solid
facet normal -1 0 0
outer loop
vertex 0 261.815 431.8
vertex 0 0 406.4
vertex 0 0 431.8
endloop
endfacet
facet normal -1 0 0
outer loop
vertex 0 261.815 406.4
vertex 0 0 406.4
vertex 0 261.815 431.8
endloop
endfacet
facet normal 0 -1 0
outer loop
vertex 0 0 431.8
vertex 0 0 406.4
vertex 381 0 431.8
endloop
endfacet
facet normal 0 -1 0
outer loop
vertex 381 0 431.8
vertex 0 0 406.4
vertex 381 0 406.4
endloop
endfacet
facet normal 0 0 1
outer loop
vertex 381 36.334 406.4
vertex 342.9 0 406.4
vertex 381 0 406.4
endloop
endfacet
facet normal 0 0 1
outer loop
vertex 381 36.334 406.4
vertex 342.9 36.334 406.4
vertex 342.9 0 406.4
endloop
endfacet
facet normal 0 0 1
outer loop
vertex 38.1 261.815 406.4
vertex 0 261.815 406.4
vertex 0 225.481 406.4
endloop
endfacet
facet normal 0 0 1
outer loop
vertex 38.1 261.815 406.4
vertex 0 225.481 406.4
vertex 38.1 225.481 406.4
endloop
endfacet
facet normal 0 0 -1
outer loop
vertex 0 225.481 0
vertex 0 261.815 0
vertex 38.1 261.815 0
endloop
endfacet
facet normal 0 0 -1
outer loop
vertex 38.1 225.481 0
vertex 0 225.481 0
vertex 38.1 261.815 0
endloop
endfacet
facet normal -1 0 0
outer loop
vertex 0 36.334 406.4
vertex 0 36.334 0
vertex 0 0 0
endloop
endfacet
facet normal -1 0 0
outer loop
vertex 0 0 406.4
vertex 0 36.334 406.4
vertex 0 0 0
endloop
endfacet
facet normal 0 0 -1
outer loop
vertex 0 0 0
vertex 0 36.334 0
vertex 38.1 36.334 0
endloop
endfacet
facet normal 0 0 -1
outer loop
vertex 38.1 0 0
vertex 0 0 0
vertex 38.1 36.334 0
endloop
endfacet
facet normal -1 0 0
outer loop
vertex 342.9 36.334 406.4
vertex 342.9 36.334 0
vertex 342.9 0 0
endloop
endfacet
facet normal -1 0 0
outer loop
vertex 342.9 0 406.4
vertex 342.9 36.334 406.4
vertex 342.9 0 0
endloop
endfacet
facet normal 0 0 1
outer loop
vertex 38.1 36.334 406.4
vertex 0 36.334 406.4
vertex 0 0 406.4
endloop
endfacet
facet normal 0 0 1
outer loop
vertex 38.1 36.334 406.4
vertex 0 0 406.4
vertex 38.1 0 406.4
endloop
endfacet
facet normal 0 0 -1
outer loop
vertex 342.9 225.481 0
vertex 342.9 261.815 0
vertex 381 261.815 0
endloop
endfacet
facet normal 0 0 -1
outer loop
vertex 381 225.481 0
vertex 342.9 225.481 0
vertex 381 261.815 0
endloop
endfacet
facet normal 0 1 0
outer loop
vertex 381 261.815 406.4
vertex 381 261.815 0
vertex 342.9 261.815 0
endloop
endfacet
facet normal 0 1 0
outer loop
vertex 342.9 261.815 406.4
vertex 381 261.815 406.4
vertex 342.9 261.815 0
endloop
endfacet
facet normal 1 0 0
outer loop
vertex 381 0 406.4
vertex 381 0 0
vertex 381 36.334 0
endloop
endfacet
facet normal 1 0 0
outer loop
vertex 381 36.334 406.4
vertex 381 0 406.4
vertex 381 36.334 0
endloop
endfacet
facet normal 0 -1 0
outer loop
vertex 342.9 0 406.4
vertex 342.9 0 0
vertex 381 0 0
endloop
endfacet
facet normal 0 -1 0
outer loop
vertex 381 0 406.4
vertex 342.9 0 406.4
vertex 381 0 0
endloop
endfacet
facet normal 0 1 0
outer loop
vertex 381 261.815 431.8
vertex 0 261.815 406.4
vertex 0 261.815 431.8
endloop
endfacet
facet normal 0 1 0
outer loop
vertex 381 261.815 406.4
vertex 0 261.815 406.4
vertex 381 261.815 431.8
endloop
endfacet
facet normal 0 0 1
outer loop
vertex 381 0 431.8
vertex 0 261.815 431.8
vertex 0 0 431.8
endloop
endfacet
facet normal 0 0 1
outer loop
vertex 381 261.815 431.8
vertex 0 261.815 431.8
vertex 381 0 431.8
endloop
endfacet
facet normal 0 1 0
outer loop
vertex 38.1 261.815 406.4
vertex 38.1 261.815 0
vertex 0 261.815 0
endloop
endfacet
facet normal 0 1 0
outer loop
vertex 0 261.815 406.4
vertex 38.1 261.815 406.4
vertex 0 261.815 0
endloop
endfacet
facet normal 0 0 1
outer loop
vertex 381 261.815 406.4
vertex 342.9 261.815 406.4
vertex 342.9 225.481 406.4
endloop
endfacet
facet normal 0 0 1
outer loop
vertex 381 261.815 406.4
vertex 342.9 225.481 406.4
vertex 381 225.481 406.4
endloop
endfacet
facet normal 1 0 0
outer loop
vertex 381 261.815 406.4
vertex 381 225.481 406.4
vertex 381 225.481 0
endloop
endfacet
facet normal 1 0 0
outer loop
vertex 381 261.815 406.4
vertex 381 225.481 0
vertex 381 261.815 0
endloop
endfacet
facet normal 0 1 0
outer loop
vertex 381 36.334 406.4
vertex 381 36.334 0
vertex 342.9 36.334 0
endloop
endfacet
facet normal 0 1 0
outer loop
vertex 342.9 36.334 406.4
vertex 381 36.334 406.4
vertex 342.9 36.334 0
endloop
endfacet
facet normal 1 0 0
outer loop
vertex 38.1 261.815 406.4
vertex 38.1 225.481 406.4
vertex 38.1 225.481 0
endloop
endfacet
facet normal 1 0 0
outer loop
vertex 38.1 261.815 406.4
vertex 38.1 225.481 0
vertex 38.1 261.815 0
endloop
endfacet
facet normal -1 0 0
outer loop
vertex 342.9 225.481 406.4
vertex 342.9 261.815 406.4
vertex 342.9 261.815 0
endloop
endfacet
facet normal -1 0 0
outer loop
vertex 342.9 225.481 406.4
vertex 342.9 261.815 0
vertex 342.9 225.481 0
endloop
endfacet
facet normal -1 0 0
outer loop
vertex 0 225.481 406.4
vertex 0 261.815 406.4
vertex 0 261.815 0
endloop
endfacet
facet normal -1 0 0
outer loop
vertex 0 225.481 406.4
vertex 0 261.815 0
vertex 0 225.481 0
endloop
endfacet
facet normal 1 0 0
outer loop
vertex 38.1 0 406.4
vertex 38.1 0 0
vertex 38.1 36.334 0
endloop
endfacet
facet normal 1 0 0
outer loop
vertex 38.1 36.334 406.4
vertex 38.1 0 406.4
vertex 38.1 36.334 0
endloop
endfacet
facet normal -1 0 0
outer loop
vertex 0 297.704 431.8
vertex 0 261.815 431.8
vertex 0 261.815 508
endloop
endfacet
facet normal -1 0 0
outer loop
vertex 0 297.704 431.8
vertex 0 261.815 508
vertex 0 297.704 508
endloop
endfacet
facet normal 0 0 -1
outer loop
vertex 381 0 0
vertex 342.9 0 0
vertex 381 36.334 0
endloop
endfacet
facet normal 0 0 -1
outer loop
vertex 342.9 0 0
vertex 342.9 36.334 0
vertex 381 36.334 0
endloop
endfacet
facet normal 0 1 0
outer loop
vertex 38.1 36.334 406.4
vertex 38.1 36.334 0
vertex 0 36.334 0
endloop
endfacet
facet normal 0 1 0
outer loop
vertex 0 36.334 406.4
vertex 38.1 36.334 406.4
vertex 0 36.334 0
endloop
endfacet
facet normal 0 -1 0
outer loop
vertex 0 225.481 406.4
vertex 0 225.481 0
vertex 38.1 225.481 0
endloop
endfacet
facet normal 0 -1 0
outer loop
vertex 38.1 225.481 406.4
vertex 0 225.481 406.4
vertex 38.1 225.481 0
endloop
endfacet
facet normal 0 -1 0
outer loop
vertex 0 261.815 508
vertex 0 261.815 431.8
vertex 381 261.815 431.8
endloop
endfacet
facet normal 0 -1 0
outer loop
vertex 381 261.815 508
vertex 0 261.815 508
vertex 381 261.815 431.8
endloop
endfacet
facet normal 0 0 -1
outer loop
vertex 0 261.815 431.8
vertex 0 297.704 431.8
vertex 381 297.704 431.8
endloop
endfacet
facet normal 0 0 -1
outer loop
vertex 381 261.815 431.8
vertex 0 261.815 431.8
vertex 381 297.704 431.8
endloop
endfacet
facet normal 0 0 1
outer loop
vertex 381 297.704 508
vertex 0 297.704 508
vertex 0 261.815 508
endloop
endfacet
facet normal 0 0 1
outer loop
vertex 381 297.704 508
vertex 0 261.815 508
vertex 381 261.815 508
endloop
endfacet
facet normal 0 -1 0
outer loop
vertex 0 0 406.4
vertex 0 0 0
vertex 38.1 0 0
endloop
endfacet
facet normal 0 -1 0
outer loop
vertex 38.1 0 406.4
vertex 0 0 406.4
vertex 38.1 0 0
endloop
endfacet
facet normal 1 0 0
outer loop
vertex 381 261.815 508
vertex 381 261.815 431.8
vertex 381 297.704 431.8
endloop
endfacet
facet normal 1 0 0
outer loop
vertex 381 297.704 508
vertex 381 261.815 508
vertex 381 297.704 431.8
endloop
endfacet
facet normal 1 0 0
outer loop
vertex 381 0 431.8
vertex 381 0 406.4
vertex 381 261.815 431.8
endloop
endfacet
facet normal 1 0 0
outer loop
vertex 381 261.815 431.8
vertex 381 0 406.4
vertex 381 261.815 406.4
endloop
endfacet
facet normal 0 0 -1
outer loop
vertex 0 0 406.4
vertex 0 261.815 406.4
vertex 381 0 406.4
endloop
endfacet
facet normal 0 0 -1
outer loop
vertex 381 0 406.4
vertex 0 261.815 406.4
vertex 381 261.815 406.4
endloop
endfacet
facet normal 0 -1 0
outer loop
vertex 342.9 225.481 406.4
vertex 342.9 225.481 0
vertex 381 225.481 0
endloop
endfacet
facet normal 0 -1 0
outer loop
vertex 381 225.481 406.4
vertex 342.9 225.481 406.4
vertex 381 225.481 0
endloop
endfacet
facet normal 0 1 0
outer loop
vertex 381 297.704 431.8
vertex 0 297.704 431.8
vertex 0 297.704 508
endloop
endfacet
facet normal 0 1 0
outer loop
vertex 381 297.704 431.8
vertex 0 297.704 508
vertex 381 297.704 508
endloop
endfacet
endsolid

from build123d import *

# Parameters (mm, degrees)
F1_DEPTH = 406.4
F2_W     = 381
F2_H     = 261.814931
F3_DEPTH = 25.4
F4_W     = 381
F4_H     = 35.888812
F5_DEPTH = 76.2


with BuildPart() as f1:
    # F0 (on Top) → F1 (new body)
    with BuildSketch(Plane.XY):
        Polygon((0, 36.33377), (0, 0), (38.1, 0), (38.1, 3.907465), (38.1, 36.33377), align=None)
        Polygon((38.1, 225.48116), (38.1, 257.907465), (38.1, 261.814931), (0, 261.814931), (0, 225.48116), align=None)
        Polygon((342.9, 261.814931), (342.9, 257.907465), (342.9, 225.48116), (381, 225.48116), (381, 261.814931), align=None)
        Polygon((342.9, 3.907465), (342.9, 0), (381, 0), (381, 36.33377), (342.9, 36.33377), align=None)
    extrude(amount=F1_DEPTH)


with BuildPart() as f3:
    # F2 (on face) → F3 (new body)
    with BuildSketch(Plane.XY.offset(406.4)):
        with Locations((190.5, 130.907466)):
            Rectangle(F2_W, F2_H)
    extrude(amount=F3_DEPTH)


with BuildPart() as f5:
    # F4 (on face) → F5 (new body)
    with BuildSketch(Plane.XY.offset(431.8)):
        with Locations((190.5, 279.759337)):
            Rectangle(F4_W, F4_H)
    extrude(amount=F5_DEPTH)


solid = Compound([f1.part, f3.part, f5.part])
